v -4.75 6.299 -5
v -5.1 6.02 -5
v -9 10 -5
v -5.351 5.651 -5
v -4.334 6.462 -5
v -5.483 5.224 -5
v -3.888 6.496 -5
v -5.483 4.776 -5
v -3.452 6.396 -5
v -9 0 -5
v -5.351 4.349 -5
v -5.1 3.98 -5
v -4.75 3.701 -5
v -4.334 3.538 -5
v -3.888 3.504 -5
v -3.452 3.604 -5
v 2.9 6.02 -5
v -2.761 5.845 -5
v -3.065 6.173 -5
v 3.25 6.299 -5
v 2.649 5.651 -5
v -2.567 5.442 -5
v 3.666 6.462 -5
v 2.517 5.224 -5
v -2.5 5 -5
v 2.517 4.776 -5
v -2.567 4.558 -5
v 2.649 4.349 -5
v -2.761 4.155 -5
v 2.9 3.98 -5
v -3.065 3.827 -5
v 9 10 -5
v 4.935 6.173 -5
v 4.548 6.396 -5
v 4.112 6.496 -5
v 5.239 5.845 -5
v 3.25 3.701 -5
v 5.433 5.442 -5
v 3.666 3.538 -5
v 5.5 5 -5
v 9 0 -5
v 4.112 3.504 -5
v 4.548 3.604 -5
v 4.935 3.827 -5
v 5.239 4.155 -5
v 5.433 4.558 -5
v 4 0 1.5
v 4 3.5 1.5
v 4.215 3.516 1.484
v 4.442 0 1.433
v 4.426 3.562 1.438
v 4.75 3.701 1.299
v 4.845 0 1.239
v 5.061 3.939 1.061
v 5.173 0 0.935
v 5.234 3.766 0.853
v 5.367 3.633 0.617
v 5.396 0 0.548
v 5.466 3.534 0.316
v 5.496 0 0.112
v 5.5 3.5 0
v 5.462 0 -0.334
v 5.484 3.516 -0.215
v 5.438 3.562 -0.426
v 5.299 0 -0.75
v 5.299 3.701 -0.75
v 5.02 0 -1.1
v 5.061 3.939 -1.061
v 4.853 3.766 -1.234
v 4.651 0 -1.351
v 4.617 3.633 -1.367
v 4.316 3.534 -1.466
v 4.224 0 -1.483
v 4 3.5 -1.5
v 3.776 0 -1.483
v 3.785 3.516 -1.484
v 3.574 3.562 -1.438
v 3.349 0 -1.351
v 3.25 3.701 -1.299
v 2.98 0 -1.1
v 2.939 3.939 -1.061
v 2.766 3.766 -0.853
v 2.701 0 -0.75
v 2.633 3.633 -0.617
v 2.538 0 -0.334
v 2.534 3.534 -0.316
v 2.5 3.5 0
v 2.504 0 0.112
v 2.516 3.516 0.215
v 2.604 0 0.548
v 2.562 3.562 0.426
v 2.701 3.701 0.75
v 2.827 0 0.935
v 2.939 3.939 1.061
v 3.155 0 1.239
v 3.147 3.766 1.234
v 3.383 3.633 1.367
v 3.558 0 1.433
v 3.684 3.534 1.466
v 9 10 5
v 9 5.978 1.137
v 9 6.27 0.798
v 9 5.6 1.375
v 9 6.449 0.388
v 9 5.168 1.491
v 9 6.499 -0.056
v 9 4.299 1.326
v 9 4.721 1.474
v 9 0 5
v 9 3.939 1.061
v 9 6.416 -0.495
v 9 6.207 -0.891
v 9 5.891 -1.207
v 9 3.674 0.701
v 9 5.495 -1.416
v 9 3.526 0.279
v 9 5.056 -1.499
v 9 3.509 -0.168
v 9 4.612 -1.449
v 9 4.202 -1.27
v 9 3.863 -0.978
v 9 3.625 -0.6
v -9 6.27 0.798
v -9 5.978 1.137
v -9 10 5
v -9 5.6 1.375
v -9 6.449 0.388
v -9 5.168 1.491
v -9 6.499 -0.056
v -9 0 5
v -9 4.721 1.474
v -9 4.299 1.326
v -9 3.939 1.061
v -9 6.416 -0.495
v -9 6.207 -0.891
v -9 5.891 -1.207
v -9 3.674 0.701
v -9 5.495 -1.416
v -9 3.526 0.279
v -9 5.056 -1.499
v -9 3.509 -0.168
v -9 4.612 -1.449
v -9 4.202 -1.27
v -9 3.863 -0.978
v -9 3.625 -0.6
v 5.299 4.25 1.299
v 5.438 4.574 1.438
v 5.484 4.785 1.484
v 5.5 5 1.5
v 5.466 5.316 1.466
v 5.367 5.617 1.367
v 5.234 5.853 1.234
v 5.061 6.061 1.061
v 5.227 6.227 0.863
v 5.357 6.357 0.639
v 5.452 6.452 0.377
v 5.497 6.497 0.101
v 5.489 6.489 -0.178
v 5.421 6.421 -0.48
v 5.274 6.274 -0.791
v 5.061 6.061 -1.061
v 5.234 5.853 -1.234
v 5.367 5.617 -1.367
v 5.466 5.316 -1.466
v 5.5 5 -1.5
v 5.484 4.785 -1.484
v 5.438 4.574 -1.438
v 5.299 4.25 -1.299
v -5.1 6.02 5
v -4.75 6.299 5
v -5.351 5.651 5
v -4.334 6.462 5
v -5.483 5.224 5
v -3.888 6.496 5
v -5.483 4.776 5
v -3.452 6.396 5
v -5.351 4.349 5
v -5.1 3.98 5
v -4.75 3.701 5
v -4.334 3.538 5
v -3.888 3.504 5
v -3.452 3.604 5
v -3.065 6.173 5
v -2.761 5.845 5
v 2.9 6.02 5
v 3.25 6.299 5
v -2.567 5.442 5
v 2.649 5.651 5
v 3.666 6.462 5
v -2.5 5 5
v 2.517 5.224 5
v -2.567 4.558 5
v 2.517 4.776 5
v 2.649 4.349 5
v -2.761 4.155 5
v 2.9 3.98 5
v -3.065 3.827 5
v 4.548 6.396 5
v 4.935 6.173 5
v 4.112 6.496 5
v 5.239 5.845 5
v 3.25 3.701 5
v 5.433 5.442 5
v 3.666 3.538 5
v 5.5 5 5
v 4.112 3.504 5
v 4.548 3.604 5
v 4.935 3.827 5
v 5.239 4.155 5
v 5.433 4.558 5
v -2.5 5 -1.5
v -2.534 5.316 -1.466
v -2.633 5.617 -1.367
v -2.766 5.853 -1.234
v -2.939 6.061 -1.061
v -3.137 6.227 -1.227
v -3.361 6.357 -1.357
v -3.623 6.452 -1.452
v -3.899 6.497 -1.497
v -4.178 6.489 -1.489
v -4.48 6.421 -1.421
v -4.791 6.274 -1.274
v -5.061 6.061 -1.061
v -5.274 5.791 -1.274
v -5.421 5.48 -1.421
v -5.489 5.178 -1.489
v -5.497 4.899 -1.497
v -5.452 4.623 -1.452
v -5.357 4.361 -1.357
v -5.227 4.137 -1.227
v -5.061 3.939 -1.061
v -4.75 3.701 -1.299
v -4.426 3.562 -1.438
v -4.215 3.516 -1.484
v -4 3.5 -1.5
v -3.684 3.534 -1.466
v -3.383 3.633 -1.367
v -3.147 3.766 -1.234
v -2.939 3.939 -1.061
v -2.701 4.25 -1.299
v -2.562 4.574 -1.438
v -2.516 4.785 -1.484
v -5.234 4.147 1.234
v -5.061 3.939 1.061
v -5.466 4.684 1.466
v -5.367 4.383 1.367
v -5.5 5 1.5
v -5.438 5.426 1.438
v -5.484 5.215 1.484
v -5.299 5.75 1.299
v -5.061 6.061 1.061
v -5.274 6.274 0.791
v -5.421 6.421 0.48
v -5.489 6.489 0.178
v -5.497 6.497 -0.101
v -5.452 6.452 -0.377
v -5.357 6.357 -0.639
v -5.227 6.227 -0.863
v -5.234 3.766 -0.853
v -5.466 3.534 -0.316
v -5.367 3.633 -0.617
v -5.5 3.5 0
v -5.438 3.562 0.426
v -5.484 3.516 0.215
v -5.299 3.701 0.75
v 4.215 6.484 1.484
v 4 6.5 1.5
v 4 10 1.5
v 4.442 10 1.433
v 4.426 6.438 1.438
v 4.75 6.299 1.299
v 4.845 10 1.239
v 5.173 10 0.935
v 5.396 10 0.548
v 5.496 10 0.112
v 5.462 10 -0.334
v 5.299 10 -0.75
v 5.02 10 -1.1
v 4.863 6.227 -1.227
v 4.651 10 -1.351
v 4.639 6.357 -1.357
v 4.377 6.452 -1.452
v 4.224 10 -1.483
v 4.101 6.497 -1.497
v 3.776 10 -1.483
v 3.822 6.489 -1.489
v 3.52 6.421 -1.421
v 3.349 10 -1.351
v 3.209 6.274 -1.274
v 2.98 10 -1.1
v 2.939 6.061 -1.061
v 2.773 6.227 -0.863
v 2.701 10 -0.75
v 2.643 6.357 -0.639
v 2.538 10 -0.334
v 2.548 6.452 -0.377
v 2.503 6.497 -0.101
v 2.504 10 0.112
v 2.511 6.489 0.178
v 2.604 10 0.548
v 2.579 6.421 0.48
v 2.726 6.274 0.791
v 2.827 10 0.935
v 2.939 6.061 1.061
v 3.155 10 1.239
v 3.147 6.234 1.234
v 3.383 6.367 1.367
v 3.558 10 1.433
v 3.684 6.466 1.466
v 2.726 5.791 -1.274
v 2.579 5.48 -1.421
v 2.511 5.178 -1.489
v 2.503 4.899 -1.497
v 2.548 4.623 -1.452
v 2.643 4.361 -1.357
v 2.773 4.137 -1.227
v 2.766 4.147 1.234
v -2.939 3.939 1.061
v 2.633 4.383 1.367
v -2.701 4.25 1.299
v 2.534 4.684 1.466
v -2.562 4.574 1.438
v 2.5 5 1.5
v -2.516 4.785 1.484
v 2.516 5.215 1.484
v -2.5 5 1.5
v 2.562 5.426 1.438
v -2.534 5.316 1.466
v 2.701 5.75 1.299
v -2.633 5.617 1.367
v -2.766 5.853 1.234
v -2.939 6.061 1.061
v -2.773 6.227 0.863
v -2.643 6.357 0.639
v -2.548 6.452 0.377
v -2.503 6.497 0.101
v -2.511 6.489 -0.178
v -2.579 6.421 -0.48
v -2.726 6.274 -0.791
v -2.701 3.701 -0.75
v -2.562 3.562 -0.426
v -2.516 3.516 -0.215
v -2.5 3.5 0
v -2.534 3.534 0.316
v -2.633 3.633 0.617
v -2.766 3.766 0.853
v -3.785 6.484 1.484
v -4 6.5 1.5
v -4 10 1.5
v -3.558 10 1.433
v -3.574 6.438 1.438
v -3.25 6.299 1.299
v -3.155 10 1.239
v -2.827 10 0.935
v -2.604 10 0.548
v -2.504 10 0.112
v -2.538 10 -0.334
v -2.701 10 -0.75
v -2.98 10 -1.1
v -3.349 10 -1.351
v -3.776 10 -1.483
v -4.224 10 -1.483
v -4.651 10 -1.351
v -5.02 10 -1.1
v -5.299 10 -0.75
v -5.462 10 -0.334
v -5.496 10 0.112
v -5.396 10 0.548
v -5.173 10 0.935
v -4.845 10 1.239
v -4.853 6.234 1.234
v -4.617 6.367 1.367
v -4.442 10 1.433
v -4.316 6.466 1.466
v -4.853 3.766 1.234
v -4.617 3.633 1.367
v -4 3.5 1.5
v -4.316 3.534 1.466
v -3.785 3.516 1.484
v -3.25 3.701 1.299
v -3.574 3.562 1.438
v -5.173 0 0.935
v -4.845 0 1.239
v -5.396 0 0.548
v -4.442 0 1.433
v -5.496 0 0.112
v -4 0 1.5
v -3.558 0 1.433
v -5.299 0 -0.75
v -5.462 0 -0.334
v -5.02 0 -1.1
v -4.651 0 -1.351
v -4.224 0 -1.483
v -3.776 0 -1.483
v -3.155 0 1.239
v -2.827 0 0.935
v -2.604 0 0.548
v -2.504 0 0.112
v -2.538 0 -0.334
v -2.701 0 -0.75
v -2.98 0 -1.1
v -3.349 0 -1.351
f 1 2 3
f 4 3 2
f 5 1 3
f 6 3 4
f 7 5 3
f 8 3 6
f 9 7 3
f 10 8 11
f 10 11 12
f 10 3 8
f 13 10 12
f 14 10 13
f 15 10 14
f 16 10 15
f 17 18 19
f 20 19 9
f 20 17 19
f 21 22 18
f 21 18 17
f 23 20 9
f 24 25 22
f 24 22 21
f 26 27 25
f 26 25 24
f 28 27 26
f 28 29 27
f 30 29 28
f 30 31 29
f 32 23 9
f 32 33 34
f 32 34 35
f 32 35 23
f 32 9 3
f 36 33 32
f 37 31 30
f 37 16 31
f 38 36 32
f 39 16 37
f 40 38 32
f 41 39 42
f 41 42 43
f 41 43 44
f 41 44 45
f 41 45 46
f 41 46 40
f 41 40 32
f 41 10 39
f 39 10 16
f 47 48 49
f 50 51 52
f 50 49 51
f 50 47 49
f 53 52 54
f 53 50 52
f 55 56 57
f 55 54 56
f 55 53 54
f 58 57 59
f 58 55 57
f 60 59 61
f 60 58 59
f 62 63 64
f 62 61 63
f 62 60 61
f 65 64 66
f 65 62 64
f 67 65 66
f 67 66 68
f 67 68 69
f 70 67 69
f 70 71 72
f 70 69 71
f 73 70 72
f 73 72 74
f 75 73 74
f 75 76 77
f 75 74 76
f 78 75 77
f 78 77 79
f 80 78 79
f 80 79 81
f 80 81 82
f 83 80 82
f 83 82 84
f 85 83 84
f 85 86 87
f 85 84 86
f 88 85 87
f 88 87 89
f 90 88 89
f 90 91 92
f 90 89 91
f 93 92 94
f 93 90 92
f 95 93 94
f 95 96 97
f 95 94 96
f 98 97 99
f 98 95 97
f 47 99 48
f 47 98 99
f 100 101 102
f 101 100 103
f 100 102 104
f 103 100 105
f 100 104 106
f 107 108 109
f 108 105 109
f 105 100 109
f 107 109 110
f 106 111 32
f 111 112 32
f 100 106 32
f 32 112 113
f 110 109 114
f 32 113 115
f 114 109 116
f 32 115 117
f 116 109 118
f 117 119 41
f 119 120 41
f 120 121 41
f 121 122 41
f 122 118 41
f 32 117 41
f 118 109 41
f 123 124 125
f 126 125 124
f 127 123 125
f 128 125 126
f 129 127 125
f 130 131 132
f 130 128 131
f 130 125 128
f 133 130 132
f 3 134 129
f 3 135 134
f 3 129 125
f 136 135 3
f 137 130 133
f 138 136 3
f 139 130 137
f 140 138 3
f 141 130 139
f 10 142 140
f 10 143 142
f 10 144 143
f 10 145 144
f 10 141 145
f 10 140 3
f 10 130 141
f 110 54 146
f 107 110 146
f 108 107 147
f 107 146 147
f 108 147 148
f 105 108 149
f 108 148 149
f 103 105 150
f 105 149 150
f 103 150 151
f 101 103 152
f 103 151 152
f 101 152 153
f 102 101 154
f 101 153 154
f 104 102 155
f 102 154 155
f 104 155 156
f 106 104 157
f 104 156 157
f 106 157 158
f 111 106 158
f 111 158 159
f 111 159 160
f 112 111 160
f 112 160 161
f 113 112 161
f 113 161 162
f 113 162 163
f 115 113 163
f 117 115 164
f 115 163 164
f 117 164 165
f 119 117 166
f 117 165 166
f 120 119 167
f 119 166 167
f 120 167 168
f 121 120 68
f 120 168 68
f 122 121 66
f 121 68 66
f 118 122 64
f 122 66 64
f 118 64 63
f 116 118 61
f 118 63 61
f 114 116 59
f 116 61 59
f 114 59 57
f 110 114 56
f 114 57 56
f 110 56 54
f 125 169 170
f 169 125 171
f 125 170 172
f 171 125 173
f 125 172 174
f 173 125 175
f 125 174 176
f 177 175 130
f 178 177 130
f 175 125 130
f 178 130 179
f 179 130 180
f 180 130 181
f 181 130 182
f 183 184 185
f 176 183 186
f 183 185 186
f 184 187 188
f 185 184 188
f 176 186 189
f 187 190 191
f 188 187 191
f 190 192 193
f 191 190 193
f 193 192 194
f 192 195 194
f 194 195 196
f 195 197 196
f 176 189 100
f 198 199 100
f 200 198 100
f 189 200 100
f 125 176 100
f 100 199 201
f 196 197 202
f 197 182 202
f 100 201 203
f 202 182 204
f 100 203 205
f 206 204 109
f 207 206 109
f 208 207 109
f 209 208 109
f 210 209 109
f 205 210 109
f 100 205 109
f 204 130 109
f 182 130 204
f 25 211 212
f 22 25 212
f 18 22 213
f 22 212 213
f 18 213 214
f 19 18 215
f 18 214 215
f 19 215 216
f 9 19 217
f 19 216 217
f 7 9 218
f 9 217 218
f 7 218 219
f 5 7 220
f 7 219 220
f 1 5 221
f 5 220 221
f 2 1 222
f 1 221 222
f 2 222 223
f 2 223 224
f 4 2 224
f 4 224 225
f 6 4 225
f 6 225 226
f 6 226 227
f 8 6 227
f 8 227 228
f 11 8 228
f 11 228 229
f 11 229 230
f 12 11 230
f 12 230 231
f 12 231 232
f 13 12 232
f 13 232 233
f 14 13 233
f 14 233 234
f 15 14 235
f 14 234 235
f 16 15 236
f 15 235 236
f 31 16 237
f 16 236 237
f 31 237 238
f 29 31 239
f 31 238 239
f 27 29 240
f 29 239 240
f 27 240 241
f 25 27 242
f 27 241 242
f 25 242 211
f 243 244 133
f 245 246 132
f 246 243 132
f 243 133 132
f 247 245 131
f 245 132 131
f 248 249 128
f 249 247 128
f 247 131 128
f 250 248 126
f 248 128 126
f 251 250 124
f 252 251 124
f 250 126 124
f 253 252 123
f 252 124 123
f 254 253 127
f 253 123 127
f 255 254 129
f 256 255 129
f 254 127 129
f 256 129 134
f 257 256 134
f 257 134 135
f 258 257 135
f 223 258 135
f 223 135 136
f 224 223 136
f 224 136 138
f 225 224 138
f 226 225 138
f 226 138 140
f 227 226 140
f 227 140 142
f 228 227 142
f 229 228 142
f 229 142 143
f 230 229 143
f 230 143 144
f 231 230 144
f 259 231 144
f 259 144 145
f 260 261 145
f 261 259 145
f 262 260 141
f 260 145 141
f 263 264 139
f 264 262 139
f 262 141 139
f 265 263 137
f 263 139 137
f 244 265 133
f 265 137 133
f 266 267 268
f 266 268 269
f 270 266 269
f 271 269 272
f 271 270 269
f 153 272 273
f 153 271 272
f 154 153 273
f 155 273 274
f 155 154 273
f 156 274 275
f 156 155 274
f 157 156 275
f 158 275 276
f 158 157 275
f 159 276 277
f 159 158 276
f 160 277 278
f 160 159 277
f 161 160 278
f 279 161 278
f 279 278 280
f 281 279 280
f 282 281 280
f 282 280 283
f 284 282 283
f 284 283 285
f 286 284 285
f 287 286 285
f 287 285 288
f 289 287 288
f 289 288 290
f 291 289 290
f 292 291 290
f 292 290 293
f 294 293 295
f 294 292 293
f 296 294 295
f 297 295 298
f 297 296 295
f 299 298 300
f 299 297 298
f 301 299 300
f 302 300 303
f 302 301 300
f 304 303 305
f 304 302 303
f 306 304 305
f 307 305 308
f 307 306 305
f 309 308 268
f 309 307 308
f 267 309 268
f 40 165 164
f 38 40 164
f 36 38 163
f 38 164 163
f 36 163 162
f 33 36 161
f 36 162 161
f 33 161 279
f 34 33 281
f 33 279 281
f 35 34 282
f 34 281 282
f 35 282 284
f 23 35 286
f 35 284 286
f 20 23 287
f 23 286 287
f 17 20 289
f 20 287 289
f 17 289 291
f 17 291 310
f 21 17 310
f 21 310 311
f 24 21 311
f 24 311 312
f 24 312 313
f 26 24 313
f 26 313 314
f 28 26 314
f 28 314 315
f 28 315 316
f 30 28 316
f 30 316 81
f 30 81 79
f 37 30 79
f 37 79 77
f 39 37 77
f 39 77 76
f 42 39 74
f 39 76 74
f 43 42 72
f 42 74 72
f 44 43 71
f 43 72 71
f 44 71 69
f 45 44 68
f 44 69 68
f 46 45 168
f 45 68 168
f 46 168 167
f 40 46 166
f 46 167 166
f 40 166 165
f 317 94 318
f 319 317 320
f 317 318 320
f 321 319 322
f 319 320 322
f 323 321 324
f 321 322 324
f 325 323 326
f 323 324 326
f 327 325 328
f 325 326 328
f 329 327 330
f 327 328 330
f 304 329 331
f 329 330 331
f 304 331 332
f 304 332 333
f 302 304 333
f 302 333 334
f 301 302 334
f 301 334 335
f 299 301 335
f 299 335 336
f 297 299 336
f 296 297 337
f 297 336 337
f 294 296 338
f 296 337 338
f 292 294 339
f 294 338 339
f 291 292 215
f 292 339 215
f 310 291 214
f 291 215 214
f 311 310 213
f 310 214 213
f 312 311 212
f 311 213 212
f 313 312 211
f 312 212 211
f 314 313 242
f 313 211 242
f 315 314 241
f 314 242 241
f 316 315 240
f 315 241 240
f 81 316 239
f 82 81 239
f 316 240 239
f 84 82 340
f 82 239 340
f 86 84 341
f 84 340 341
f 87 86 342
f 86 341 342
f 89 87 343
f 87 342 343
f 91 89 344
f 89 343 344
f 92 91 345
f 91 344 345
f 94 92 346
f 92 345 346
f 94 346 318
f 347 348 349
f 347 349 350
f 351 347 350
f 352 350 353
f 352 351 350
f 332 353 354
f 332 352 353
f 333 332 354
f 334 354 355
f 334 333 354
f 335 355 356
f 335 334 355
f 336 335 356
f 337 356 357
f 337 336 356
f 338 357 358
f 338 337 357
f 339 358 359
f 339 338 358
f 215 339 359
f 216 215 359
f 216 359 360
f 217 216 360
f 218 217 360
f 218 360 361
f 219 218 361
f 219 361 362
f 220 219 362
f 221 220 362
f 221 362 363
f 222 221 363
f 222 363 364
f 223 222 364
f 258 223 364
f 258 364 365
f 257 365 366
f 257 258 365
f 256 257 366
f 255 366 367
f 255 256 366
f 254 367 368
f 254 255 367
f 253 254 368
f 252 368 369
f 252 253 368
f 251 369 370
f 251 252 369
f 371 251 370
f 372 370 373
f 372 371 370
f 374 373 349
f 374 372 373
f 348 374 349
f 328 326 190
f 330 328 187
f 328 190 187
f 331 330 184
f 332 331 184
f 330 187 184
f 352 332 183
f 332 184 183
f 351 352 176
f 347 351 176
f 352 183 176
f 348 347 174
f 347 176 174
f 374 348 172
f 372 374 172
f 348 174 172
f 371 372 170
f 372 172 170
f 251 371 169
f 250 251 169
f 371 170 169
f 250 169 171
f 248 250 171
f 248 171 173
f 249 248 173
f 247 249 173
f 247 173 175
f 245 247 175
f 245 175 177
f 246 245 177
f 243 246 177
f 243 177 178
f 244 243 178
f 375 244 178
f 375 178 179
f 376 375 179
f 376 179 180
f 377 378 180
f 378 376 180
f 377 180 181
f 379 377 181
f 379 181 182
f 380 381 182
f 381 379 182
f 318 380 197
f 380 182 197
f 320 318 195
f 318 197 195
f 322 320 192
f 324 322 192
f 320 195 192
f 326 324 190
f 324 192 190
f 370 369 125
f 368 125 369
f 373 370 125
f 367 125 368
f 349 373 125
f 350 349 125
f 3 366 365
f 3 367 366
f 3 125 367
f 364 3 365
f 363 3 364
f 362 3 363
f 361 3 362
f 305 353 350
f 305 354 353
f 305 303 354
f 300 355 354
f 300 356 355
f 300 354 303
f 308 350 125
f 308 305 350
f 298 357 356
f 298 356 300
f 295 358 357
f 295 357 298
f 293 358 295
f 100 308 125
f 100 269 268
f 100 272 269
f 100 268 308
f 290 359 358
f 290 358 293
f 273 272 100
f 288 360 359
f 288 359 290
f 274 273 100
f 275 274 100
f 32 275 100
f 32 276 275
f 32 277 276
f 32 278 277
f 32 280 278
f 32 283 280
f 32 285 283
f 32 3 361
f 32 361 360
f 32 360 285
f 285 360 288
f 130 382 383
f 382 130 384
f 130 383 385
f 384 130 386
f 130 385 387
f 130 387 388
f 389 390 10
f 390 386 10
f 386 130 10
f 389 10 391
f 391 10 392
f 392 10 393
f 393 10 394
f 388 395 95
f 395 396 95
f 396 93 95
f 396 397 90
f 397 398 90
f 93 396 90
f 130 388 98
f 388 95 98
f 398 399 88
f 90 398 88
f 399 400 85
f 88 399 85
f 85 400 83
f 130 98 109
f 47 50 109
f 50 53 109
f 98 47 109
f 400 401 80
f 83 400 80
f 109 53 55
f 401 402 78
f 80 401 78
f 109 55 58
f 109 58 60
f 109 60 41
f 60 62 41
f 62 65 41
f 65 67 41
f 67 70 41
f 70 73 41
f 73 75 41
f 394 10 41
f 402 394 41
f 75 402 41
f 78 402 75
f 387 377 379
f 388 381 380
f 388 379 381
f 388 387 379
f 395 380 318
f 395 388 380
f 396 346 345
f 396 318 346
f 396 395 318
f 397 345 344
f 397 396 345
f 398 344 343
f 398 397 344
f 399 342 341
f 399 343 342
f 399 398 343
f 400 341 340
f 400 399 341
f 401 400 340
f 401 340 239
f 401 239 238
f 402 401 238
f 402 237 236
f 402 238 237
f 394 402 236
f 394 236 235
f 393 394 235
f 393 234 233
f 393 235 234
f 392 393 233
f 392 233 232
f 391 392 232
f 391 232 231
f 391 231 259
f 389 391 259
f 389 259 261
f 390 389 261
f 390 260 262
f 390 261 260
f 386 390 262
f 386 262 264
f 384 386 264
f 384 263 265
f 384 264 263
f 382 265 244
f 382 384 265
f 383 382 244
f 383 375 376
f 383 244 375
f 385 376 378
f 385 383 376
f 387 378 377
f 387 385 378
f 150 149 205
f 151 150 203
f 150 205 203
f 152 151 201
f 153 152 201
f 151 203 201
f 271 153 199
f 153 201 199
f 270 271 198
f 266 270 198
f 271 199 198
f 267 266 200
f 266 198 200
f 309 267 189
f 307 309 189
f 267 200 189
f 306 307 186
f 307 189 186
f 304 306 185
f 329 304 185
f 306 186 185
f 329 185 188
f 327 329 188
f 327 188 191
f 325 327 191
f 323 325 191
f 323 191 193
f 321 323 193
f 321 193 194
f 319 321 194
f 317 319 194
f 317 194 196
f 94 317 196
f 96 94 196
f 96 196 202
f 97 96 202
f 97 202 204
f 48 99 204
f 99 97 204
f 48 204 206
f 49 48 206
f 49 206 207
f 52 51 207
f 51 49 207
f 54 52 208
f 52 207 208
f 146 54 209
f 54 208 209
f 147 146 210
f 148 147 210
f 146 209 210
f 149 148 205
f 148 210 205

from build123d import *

# Parameters (mm, degrees)
SKETCH_1_W          = 18
SKETCH_1_H          = 10
SKETCH_1_R          = 1.5
EXTRUDE_1_DEPTH     = 10
SKETCH_2_R          = 1.5
CUT_EXTRUDE_1_DEPTH = 10
SKETCH_4_R          = 1.5
CUT_EXTRUDE_2_DEPTH = 25


with BuildPart() as part:
    # 草图1 → 凸台-拉伸1 (new body)
    with BuildSketch(Plane(origin=(0, 0, 0), x_dir=(1, 0, 0), z_dir=(0, 1, 0))):
        Rectangle(SKETCH_1_W, SKETCH_1_H)
        with Locations(Location((-4, 0, 0), (0, 0, 270))):
            Circle(SKETCH_1_R, mode=Mode.SUBTRACT)
        with Locations(Location((4, 0, 0), (0, 0, 270))):
            Circle(SKETCH_1_R, mode=Mode.SUBTRACT)
    extrude(amount=EXTRUDE_1_DEPTH)

    # 草图2 → 切除-拉伸1 (cut)
    with BuildSketch(Plane.XY.offset(5)):
        with Locations((-4, 5)):
            Circle(SKETCH_2_R)
        with Locations((4, 5)):
            Circle(SKETCH_2_R)
    extrude(amount=-CUT_EXTRUDE_1_DEPTH, mode=Mode.SUBTRACT)

    # 草图4 → 切除-拉伸2 (cut)
    with BuildSketch(Plane.ZY.offset(9)):
        with Locations(Location((0, 5, 0), (0, 0, 315))):
            Circle(SKETCH_4_R)
    extrude(amount=-CUT_EXTRUDE_2_DEPTH, mode=Mode.SUBTRACT)


solid = part.part
